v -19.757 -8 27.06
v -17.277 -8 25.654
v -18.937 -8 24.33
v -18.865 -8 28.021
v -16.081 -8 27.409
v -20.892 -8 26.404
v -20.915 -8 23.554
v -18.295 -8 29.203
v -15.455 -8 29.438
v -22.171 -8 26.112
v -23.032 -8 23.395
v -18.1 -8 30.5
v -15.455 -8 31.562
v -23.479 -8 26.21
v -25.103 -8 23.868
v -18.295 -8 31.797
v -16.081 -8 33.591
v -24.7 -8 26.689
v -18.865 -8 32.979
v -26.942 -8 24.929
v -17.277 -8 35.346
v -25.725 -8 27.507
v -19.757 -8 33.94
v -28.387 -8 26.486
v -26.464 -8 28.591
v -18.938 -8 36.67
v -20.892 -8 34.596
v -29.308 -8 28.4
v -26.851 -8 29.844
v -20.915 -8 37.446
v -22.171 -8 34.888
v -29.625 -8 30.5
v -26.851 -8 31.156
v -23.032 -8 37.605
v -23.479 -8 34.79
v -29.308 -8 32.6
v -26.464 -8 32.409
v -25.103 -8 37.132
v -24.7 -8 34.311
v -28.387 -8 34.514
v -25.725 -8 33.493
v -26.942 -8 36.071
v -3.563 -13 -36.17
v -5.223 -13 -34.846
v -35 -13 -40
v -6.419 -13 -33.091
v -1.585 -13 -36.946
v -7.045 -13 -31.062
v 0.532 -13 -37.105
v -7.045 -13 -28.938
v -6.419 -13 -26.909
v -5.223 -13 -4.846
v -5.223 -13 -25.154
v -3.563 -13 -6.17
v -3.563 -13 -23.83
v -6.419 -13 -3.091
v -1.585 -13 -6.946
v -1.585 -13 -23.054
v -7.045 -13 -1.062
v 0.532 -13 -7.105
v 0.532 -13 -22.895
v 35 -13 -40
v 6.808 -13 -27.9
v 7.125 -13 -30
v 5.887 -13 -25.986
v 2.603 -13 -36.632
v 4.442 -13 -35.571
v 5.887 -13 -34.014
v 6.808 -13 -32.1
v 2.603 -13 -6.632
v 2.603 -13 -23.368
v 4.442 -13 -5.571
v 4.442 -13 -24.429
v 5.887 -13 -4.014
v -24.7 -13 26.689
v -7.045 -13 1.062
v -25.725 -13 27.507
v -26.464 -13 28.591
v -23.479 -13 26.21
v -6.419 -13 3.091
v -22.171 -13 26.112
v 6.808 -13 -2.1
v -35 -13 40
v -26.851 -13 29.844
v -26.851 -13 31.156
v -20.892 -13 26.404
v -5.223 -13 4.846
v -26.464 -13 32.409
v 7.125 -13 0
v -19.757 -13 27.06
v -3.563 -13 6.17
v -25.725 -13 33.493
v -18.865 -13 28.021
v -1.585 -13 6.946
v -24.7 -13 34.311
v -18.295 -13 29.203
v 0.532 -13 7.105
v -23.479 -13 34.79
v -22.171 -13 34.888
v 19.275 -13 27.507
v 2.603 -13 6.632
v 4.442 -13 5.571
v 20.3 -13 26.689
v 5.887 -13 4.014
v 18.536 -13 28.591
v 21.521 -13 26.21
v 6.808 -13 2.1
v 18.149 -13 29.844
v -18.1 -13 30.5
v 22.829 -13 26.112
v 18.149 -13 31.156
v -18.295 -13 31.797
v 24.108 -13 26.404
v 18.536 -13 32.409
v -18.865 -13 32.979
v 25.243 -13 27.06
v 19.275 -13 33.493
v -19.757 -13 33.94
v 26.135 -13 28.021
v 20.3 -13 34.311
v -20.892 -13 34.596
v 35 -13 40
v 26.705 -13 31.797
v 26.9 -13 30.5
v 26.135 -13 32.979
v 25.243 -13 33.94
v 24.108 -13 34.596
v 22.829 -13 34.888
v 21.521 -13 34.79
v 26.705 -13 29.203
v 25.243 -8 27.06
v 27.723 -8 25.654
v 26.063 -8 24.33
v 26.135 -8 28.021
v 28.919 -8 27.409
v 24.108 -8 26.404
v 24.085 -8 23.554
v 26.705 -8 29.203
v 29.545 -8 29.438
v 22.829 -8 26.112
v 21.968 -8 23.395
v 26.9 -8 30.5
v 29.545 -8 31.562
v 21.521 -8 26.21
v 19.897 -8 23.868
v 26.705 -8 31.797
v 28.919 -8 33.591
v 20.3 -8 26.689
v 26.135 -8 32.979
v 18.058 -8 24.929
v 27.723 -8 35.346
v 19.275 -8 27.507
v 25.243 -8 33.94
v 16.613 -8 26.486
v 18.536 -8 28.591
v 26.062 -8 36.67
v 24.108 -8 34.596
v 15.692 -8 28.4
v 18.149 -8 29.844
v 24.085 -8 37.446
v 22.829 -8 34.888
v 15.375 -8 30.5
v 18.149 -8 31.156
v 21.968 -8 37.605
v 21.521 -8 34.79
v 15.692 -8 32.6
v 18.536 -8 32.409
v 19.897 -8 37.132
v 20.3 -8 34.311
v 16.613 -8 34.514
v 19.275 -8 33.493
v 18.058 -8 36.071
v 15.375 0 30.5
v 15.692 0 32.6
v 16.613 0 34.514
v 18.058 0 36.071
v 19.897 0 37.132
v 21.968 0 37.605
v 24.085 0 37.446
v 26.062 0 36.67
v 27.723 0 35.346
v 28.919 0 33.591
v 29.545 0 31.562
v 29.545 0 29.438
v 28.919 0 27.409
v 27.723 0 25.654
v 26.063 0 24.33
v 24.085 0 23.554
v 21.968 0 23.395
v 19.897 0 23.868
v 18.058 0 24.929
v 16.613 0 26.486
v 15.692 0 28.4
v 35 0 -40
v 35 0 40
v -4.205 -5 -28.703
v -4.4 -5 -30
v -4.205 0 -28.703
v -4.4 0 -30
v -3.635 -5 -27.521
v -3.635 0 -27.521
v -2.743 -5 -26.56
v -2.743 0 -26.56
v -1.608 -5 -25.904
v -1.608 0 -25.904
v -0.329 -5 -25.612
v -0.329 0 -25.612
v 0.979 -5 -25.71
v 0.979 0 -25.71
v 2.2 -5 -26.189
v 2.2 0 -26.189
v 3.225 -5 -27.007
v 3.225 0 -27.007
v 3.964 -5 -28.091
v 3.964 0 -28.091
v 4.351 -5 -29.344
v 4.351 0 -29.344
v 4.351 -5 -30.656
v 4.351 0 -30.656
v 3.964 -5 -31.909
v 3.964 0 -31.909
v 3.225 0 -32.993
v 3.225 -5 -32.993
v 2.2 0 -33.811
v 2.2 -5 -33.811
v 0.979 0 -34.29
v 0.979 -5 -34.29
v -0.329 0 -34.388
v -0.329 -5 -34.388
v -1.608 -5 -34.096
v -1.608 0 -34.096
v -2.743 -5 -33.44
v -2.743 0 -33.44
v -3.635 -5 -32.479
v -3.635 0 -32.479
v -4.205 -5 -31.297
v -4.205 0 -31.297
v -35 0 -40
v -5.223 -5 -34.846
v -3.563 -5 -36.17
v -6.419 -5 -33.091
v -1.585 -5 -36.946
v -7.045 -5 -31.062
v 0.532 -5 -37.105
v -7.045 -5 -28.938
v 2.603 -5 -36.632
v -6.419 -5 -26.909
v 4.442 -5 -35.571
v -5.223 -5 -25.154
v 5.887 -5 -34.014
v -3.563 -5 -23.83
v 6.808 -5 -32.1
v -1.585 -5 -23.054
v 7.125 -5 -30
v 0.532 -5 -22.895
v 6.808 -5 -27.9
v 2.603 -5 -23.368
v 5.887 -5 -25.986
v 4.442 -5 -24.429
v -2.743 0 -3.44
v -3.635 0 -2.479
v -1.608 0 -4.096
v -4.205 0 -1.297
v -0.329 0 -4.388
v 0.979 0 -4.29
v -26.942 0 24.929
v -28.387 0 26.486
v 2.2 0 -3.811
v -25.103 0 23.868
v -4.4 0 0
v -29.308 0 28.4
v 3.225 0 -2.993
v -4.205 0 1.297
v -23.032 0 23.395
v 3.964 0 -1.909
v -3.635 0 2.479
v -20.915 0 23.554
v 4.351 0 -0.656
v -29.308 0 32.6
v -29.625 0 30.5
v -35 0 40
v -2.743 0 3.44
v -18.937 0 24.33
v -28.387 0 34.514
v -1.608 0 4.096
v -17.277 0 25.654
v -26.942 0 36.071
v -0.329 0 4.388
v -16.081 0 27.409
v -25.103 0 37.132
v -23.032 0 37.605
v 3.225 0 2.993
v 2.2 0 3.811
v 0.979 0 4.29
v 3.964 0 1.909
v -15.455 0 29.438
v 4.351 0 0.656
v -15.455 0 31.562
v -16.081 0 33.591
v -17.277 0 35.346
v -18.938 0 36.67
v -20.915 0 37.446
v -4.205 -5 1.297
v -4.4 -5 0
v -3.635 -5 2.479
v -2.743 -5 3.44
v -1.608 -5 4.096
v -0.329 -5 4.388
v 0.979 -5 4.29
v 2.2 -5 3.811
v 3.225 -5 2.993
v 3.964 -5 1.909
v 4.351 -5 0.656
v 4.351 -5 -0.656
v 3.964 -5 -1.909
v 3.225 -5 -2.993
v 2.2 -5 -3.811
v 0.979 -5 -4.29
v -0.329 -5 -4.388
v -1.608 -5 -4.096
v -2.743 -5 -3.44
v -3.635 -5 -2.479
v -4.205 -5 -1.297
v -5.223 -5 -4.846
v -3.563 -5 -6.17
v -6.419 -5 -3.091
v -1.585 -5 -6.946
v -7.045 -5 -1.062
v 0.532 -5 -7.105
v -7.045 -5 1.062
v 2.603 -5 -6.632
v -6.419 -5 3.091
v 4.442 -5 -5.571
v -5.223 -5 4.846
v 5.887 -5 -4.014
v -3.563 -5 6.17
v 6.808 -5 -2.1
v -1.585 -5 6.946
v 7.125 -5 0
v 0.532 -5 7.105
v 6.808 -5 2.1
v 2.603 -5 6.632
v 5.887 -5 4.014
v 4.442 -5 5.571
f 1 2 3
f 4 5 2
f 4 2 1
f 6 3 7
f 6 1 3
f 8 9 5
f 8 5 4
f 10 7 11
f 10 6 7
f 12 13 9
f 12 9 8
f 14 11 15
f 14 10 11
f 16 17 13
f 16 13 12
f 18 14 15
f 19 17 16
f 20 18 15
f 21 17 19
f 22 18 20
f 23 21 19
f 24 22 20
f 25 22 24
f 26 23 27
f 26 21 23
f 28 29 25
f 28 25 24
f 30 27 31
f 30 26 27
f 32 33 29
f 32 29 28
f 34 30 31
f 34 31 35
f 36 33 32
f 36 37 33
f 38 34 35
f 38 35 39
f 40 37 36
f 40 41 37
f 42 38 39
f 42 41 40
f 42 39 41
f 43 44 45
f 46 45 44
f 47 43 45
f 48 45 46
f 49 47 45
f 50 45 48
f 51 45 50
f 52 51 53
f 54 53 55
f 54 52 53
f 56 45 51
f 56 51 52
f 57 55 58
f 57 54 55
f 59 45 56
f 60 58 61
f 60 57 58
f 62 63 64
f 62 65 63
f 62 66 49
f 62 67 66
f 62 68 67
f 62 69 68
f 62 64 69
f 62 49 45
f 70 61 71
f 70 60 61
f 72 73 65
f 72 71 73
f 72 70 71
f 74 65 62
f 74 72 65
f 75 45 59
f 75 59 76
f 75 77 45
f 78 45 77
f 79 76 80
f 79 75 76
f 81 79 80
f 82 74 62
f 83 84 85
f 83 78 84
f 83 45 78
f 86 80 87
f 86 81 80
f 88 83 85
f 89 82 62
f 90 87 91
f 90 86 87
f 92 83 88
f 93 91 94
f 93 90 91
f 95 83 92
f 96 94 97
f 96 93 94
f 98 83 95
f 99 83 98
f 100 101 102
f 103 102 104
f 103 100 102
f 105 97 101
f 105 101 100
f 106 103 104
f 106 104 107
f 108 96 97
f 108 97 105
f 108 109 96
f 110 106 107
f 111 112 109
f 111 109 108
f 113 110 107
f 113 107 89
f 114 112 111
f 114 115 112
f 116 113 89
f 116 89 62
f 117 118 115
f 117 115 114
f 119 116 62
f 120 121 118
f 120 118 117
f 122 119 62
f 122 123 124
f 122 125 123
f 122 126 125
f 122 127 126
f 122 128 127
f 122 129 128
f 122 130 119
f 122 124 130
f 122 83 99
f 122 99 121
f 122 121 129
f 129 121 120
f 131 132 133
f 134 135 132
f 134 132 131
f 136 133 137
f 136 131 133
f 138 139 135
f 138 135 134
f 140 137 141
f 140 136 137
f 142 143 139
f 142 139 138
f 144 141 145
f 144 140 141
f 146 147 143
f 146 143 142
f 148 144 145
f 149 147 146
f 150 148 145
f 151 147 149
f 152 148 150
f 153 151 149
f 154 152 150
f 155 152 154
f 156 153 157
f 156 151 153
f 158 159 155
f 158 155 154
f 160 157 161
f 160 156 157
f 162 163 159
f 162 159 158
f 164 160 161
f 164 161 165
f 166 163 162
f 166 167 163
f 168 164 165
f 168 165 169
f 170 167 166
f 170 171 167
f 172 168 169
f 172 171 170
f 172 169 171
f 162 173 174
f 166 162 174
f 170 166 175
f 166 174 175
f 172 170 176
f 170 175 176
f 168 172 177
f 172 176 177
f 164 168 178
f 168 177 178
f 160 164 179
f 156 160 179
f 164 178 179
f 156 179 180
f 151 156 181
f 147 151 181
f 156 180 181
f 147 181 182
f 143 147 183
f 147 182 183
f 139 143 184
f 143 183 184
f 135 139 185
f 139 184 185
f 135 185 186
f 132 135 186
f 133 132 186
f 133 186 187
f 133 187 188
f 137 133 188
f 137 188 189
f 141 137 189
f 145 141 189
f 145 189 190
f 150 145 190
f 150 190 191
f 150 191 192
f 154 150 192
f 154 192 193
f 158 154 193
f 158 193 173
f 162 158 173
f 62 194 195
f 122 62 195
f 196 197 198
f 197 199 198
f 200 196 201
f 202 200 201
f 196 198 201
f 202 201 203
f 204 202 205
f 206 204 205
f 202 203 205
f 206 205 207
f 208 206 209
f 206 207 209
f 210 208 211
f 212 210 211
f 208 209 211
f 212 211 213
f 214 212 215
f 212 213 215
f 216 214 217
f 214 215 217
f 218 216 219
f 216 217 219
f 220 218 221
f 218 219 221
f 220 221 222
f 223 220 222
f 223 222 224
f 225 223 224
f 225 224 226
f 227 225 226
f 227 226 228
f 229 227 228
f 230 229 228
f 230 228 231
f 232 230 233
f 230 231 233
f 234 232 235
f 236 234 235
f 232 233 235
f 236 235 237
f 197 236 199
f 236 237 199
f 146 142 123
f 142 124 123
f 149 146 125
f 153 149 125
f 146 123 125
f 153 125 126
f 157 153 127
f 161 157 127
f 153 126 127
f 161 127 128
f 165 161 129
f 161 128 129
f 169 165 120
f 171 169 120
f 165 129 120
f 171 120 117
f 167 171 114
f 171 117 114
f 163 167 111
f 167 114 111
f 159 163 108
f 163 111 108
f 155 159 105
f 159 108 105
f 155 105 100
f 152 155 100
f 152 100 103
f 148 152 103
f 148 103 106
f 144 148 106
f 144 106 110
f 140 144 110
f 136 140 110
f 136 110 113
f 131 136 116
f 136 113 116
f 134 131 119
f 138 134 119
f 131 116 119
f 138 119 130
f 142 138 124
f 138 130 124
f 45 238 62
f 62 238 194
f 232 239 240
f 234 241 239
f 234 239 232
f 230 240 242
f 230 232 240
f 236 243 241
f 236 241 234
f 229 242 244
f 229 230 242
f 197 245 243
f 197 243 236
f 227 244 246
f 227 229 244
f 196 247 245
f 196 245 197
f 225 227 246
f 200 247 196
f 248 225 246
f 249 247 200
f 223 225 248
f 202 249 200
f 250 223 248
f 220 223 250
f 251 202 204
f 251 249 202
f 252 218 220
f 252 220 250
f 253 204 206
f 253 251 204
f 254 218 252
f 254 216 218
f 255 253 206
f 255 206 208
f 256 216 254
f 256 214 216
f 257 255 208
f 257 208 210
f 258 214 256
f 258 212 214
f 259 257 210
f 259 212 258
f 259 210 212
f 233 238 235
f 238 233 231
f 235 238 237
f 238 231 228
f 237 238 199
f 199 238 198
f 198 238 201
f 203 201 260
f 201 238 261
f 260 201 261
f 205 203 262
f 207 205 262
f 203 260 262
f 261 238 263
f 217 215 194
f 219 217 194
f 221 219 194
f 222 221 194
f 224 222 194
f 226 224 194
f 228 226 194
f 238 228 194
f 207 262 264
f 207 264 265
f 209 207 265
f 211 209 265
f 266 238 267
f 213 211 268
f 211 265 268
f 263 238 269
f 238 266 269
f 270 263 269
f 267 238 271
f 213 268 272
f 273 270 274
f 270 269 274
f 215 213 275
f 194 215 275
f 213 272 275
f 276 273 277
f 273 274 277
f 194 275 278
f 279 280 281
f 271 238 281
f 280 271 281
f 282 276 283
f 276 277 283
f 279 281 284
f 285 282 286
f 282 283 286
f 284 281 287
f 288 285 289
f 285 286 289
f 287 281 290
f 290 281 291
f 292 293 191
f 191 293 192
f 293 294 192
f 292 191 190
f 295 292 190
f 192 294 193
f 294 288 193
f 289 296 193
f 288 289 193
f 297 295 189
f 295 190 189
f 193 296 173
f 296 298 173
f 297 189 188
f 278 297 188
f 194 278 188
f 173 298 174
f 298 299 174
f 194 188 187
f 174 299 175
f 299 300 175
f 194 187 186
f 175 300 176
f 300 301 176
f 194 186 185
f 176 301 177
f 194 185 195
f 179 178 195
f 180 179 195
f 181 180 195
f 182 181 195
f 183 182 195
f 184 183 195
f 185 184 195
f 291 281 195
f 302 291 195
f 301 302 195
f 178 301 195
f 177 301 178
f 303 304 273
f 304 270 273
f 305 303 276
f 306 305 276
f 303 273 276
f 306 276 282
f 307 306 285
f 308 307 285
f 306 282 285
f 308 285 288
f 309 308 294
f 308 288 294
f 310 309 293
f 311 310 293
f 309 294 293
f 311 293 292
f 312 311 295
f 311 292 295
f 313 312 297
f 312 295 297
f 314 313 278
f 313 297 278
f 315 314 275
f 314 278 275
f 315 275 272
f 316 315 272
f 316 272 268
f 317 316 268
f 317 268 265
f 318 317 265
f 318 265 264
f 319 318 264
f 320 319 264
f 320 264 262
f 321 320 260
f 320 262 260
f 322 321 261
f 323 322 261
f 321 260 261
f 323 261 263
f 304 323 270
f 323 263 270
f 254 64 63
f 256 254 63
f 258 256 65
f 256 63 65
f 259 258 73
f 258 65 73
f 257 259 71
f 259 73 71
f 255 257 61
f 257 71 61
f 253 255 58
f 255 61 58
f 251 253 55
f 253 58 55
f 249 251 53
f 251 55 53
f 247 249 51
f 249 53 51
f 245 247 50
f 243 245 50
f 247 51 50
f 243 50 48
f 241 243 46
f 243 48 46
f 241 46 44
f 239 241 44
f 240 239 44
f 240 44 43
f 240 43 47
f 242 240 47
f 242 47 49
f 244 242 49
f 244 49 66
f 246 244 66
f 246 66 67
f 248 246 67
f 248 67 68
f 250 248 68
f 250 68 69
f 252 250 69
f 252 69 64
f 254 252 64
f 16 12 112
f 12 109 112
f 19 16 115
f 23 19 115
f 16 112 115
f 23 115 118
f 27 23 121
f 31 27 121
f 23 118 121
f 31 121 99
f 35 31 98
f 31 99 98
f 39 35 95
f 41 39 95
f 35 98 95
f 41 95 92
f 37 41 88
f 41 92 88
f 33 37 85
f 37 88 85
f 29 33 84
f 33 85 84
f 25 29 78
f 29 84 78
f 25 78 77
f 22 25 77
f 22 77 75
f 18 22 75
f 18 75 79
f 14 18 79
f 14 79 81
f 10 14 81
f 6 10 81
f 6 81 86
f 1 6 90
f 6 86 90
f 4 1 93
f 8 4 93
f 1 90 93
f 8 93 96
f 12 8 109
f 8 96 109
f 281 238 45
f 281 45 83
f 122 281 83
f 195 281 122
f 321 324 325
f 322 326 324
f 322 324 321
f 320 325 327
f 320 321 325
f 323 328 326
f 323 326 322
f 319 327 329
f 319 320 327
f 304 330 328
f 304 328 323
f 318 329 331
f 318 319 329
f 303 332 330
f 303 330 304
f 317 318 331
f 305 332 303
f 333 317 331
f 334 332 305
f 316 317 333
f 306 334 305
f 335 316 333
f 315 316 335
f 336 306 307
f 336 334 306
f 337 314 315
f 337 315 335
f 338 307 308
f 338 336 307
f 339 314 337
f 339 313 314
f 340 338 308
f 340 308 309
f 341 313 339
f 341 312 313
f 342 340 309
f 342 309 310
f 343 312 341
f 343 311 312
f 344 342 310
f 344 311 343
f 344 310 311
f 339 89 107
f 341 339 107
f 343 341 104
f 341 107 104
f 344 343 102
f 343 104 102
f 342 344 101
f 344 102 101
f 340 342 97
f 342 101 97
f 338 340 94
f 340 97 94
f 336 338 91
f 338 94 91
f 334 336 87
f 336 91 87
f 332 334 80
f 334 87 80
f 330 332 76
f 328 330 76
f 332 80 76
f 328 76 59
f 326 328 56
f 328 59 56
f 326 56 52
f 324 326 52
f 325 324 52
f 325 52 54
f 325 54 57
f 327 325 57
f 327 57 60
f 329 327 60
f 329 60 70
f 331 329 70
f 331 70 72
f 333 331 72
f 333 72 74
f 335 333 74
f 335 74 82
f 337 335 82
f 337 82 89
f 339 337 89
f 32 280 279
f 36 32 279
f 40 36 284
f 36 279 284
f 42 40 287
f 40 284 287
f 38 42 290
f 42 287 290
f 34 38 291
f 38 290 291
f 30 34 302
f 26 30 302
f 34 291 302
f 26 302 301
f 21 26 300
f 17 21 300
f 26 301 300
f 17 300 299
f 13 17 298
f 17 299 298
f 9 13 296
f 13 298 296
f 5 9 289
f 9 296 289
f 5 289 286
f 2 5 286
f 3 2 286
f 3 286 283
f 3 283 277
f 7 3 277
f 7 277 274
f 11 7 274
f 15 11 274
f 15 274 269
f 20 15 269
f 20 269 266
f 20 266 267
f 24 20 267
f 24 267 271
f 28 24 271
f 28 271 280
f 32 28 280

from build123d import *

# Parameters (mm, degrees)
F0_W           = 70
F0_H           = 80
F1_DEPTH       = 13
F4_D           = 8.8
F4_DEPTH       = 22.75
F4_CBORE_D     = 14.25
F4_CBORE_DEPTH = 8
F4_TIP         = 2.6437867237
F5_D           = 8.8
F5_DEPTH       = 22.75
F5_CBORE_D     = 14.25
F5_CBORE_DEPTH = 8
F5_TIP         = 2.6437867237


with BuildPart() as f1:
    # F0 (on Front) → F1 (new body)
    with BuildSketch(Plane.XZ):
        Rectangle(F0_W, F0_H)
    extrude(amount=F1_DEPTH)

    # F4
    with Locations(Plane(origin=(0, 0, 0), x_dir=(-1, 0, 0), z_dir=(0, 1, 0))):
        with Locations((-22.5, 30.5), (22.5, 30.5)):
            CounterBoreHole(F4_D / 2, F4_CBORE_D / 2, F4_CBORE_DEPTH, depth=F4_DEPTH)
            with Locations((0, 0, -(F4_DEPTH + F4_TIP / 2))):  # 118° drill point
                Cone(0, F4_D / 2, F4_TIP, mode=Mode.SUBTRACT)

    # F5
    with Locations(Plane.XZ.offset(13)):
        with Locations((0, 0), (0, -30)):
            CounterBoreHole(F5_D / 2, F5_CBORE_D / 2, F5_CBORE_DEPTH, depth=F5_DEPTH)
            with Locations((0, 0, -(F5_DEPTH + F5_TIP / 2))):  # 118° drill point
                Cone(0, F5_D / 2, F5_TIP, mode=Mode.SUBTRACT)


solid = f1.part
